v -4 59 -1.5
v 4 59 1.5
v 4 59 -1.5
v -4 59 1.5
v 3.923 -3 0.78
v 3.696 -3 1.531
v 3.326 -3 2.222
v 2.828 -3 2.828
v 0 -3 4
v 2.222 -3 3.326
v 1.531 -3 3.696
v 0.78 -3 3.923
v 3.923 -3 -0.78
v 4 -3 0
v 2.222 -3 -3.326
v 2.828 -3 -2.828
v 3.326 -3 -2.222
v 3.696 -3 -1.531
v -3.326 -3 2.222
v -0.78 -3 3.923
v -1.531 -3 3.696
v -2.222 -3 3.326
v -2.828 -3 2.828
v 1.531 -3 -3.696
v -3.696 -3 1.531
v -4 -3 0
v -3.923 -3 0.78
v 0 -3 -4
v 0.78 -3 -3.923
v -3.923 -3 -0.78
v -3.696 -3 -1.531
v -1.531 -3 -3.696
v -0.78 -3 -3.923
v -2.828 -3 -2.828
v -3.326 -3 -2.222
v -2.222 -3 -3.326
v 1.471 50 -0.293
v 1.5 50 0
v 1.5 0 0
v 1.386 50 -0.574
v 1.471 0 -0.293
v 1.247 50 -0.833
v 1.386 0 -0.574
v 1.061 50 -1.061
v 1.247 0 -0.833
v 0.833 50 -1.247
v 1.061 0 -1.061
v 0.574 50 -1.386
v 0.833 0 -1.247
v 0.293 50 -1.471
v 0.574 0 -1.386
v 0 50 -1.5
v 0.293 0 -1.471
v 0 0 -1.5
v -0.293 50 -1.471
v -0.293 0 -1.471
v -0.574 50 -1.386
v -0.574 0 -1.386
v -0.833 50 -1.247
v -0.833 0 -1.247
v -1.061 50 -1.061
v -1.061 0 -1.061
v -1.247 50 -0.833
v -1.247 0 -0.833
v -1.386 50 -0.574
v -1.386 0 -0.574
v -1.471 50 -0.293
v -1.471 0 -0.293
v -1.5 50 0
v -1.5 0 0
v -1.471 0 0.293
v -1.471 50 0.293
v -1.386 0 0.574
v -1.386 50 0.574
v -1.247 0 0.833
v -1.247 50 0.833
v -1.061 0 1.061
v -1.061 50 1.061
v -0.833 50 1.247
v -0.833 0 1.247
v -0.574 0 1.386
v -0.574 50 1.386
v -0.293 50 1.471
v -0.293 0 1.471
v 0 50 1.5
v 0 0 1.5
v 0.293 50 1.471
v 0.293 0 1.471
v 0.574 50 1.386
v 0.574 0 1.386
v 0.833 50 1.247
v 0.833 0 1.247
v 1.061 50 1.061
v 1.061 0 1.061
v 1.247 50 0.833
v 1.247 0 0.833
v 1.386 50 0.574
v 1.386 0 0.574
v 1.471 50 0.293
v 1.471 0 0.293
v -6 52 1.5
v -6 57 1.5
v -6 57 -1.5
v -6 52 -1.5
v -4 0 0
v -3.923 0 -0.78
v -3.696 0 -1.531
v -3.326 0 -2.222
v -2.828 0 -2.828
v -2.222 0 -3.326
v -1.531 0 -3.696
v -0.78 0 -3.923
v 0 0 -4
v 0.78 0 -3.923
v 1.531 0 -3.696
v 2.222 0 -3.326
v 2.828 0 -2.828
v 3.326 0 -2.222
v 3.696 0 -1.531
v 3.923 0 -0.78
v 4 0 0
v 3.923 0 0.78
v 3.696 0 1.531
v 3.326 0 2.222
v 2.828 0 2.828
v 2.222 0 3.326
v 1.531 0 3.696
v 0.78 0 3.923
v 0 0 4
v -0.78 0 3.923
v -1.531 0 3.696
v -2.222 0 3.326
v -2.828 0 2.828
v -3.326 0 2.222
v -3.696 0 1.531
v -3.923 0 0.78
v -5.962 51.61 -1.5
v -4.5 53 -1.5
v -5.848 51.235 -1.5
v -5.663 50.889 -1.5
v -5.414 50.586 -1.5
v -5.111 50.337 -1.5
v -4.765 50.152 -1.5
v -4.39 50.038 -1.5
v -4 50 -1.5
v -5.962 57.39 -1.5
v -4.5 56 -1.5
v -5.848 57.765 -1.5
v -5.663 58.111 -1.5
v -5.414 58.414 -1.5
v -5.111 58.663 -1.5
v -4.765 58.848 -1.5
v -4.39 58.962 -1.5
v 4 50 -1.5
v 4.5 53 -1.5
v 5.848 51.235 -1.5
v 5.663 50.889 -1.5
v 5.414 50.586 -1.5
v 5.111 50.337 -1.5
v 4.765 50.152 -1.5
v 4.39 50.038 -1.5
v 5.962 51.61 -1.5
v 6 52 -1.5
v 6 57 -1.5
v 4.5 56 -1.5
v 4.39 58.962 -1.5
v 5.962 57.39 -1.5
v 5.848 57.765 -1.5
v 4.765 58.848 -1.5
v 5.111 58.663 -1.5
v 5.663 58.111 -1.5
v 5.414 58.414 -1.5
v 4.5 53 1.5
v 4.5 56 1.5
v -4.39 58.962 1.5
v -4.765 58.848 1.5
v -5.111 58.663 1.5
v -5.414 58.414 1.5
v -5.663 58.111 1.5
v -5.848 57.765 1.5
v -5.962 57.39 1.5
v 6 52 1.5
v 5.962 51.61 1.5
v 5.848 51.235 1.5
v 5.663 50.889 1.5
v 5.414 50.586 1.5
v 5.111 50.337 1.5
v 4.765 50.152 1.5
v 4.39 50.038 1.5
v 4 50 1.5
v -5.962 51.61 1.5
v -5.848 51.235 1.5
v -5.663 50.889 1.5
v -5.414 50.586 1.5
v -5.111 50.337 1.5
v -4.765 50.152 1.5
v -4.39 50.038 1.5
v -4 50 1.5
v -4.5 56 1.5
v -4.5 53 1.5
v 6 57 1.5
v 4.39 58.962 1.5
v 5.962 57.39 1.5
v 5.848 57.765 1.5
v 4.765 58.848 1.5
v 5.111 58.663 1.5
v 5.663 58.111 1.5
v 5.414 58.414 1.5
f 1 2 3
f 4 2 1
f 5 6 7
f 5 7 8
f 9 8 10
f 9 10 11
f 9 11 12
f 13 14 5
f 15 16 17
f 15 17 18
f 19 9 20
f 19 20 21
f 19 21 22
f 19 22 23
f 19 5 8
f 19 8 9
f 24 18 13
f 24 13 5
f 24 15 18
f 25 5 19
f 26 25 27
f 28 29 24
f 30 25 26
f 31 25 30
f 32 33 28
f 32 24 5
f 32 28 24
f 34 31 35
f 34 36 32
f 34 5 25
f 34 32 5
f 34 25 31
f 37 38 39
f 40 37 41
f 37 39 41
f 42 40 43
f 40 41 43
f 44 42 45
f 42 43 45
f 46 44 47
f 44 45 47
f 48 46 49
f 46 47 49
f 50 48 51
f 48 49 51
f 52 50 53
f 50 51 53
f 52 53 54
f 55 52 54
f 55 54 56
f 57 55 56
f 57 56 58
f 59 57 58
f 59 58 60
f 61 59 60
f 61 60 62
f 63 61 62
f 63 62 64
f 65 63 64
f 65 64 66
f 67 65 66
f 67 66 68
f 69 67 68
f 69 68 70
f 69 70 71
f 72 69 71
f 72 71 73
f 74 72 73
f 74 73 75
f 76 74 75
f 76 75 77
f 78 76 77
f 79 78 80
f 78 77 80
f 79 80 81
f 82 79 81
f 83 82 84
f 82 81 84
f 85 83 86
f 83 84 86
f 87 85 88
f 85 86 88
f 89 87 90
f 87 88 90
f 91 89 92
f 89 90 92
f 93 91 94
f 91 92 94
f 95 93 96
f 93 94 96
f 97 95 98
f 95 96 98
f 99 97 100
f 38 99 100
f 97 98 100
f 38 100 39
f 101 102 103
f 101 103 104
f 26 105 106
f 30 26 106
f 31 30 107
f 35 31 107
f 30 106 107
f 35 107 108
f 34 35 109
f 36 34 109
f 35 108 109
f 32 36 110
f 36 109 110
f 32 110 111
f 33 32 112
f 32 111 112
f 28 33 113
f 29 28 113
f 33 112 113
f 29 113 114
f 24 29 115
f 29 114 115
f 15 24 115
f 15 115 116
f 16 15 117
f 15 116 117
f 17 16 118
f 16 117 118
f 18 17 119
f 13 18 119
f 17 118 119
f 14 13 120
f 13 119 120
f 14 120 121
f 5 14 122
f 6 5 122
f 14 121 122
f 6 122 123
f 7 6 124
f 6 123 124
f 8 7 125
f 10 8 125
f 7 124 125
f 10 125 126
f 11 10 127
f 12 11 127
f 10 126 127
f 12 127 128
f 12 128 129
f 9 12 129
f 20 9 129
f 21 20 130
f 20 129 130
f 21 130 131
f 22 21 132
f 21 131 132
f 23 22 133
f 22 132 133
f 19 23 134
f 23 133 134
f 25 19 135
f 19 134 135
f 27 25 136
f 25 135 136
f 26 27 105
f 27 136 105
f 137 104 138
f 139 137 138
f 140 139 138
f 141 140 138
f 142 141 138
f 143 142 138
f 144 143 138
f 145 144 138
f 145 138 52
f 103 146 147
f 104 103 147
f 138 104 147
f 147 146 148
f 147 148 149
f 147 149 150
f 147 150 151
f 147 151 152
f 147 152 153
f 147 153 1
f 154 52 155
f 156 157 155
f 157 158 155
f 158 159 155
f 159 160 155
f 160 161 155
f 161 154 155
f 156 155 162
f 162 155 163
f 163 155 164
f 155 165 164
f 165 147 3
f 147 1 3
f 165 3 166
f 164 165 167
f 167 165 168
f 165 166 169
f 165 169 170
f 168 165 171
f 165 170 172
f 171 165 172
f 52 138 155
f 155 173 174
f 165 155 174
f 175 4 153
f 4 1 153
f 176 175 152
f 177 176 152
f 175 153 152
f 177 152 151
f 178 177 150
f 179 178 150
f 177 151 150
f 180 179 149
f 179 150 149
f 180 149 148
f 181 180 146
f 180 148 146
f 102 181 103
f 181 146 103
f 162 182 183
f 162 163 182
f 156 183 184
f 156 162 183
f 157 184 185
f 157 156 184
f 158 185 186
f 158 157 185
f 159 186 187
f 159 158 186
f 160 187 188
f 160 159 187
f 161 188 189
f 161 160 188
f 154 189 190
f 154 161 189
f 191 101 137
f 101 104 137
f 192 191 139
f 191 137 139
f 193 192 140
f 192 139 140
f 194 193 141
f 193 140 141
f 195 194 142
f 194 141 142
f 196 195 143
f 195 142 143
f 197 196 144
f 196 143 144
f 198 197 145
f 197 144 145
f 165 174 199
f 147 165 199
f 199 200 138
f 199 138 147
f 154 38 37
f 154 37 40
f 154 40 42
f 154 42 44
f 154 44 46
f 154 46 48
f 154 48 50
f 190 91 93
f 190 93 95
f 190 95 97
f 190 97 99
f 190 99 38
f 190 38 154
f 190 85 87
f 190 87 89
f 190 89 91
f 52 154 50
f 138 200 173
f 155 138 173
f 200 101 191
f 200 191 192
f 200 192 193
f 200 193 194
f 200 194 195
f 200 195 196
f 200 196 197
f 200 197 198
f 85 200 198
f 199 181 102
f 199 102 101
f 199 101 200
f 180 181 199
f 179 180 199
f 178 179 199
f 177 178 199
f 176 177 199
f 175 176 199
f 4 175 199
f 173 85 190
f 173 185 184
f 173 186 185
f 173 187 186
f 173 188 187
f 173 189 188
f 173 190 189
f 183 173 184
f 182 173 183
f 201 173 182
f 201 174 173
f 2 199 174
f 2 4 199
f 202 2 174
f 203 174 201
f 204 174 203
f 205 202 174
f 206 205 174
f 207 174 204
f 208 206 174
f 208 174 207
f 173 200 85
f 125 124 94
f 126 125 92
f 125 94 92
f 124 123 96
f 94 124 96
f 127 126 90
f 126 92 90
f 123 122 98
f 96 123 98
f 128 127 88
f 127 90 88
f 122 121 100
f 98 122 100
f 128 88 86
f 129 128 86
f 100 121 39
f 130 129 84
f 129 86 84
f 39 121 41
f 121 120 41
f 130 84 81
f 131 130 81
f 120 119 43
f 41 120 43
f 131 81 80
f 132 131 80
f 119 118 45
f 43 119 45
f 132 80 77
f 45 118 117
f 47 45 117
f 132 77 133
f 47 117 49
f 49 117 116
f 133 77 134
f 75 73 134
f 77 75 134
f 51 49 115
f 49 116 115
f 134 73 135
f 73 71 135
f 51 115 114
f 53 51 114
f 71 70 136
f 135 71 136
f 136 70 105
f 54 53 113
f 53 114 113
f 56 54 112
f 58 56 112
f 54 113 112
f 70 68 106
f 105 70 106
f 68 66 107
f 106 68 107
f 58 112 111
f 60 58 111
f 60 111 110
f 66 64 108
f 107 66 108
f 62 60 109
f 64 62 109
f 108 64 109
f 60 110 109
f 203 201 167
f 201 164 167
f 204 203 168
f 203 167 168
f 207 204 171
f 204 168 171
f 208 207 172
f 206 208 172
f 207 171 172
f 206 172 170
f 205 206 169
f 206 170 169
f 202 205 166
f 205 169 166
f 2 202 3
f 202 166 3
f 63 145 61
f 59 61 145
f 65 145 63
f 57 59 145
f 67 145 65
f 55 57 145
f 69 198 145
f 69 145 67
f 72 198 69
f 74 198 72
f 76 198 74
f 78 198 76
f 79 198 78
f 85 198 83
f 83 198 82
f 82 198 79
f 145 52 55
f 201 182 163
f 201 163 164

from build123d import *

# Parameters (mm, degrees)
SKETCH1_R           = 1.5
BOSS_EXTRUDE1_DEPTH = 50
SKETCH2_R           = 4
BOSS_EXTRUDE2_DEPTH = 3
BOSS_EXTRUDE3_DEPTH = 3
SKETCH5_W           = 4.5
SKETCH5_H           = 3
CUT_EXTRUDE1_DEPTH  = 4
FILLET1_R           = 2


with BuildPart() as part:
    # Sketch1 → Boss-Extrude1 (new body)
    with BuildSketch(Plane(origin=(0, 0, 0), x_dir=(1, 0, 0), z_dir=(0, 1, 0))):
        Circle(SKETCH1_R)
    extrude(amount=BOSS_EXTRUDE1_DEPTH)

    # Sketch2 → Boss-Extrude2 (add)
    with BuildSketch(Plane(origin=(0, 0, 0), x_dir=(-1, 0, 0), z_dir=(0, -1, 0))):
        Circle(SKETCH2_R)
    extrude(amount=BOSS_EXTRUDE2_DEPTH)

    # Sketch4 → Boss-Extrude3 (add)
    with BuildSketch(Plane.XY.offset(1.5)):
        Polygon((0, 50), (6, 50), (6, 59), (-6, 59), (-6, 50), align=None)
    extrude(amount=-BOSS_EXTRUDE3_DEPTH)

    # Sketch5 → Cut-Extrude1 (cut)
    with BuildSketch(Plane.XY.offset(1.5)):
        with Locations((-2.25, 54.5)):
            Rectangle(SKETCH5_W, SKETCH5_H)
        with Locations((2.25, 54.5)):
            Rectangle(SKETCH5_W, SKETCH5_H)
    extrude(amount=-CUT_EXTRUDE1_DEPTH, mode=Mode.SUBTRACT)

    # Fillet1
    fillet1_edges = [part.edges().sort_by_distance(p)[0] for p in [
        (6, 50, 0),
        (-6, 50, 0),
        (-6, 59, 0),
        (6, 59, 0),
    ]]
    fillet(fillet1_edges, radius=FILLET1_R)


solid = part.part
